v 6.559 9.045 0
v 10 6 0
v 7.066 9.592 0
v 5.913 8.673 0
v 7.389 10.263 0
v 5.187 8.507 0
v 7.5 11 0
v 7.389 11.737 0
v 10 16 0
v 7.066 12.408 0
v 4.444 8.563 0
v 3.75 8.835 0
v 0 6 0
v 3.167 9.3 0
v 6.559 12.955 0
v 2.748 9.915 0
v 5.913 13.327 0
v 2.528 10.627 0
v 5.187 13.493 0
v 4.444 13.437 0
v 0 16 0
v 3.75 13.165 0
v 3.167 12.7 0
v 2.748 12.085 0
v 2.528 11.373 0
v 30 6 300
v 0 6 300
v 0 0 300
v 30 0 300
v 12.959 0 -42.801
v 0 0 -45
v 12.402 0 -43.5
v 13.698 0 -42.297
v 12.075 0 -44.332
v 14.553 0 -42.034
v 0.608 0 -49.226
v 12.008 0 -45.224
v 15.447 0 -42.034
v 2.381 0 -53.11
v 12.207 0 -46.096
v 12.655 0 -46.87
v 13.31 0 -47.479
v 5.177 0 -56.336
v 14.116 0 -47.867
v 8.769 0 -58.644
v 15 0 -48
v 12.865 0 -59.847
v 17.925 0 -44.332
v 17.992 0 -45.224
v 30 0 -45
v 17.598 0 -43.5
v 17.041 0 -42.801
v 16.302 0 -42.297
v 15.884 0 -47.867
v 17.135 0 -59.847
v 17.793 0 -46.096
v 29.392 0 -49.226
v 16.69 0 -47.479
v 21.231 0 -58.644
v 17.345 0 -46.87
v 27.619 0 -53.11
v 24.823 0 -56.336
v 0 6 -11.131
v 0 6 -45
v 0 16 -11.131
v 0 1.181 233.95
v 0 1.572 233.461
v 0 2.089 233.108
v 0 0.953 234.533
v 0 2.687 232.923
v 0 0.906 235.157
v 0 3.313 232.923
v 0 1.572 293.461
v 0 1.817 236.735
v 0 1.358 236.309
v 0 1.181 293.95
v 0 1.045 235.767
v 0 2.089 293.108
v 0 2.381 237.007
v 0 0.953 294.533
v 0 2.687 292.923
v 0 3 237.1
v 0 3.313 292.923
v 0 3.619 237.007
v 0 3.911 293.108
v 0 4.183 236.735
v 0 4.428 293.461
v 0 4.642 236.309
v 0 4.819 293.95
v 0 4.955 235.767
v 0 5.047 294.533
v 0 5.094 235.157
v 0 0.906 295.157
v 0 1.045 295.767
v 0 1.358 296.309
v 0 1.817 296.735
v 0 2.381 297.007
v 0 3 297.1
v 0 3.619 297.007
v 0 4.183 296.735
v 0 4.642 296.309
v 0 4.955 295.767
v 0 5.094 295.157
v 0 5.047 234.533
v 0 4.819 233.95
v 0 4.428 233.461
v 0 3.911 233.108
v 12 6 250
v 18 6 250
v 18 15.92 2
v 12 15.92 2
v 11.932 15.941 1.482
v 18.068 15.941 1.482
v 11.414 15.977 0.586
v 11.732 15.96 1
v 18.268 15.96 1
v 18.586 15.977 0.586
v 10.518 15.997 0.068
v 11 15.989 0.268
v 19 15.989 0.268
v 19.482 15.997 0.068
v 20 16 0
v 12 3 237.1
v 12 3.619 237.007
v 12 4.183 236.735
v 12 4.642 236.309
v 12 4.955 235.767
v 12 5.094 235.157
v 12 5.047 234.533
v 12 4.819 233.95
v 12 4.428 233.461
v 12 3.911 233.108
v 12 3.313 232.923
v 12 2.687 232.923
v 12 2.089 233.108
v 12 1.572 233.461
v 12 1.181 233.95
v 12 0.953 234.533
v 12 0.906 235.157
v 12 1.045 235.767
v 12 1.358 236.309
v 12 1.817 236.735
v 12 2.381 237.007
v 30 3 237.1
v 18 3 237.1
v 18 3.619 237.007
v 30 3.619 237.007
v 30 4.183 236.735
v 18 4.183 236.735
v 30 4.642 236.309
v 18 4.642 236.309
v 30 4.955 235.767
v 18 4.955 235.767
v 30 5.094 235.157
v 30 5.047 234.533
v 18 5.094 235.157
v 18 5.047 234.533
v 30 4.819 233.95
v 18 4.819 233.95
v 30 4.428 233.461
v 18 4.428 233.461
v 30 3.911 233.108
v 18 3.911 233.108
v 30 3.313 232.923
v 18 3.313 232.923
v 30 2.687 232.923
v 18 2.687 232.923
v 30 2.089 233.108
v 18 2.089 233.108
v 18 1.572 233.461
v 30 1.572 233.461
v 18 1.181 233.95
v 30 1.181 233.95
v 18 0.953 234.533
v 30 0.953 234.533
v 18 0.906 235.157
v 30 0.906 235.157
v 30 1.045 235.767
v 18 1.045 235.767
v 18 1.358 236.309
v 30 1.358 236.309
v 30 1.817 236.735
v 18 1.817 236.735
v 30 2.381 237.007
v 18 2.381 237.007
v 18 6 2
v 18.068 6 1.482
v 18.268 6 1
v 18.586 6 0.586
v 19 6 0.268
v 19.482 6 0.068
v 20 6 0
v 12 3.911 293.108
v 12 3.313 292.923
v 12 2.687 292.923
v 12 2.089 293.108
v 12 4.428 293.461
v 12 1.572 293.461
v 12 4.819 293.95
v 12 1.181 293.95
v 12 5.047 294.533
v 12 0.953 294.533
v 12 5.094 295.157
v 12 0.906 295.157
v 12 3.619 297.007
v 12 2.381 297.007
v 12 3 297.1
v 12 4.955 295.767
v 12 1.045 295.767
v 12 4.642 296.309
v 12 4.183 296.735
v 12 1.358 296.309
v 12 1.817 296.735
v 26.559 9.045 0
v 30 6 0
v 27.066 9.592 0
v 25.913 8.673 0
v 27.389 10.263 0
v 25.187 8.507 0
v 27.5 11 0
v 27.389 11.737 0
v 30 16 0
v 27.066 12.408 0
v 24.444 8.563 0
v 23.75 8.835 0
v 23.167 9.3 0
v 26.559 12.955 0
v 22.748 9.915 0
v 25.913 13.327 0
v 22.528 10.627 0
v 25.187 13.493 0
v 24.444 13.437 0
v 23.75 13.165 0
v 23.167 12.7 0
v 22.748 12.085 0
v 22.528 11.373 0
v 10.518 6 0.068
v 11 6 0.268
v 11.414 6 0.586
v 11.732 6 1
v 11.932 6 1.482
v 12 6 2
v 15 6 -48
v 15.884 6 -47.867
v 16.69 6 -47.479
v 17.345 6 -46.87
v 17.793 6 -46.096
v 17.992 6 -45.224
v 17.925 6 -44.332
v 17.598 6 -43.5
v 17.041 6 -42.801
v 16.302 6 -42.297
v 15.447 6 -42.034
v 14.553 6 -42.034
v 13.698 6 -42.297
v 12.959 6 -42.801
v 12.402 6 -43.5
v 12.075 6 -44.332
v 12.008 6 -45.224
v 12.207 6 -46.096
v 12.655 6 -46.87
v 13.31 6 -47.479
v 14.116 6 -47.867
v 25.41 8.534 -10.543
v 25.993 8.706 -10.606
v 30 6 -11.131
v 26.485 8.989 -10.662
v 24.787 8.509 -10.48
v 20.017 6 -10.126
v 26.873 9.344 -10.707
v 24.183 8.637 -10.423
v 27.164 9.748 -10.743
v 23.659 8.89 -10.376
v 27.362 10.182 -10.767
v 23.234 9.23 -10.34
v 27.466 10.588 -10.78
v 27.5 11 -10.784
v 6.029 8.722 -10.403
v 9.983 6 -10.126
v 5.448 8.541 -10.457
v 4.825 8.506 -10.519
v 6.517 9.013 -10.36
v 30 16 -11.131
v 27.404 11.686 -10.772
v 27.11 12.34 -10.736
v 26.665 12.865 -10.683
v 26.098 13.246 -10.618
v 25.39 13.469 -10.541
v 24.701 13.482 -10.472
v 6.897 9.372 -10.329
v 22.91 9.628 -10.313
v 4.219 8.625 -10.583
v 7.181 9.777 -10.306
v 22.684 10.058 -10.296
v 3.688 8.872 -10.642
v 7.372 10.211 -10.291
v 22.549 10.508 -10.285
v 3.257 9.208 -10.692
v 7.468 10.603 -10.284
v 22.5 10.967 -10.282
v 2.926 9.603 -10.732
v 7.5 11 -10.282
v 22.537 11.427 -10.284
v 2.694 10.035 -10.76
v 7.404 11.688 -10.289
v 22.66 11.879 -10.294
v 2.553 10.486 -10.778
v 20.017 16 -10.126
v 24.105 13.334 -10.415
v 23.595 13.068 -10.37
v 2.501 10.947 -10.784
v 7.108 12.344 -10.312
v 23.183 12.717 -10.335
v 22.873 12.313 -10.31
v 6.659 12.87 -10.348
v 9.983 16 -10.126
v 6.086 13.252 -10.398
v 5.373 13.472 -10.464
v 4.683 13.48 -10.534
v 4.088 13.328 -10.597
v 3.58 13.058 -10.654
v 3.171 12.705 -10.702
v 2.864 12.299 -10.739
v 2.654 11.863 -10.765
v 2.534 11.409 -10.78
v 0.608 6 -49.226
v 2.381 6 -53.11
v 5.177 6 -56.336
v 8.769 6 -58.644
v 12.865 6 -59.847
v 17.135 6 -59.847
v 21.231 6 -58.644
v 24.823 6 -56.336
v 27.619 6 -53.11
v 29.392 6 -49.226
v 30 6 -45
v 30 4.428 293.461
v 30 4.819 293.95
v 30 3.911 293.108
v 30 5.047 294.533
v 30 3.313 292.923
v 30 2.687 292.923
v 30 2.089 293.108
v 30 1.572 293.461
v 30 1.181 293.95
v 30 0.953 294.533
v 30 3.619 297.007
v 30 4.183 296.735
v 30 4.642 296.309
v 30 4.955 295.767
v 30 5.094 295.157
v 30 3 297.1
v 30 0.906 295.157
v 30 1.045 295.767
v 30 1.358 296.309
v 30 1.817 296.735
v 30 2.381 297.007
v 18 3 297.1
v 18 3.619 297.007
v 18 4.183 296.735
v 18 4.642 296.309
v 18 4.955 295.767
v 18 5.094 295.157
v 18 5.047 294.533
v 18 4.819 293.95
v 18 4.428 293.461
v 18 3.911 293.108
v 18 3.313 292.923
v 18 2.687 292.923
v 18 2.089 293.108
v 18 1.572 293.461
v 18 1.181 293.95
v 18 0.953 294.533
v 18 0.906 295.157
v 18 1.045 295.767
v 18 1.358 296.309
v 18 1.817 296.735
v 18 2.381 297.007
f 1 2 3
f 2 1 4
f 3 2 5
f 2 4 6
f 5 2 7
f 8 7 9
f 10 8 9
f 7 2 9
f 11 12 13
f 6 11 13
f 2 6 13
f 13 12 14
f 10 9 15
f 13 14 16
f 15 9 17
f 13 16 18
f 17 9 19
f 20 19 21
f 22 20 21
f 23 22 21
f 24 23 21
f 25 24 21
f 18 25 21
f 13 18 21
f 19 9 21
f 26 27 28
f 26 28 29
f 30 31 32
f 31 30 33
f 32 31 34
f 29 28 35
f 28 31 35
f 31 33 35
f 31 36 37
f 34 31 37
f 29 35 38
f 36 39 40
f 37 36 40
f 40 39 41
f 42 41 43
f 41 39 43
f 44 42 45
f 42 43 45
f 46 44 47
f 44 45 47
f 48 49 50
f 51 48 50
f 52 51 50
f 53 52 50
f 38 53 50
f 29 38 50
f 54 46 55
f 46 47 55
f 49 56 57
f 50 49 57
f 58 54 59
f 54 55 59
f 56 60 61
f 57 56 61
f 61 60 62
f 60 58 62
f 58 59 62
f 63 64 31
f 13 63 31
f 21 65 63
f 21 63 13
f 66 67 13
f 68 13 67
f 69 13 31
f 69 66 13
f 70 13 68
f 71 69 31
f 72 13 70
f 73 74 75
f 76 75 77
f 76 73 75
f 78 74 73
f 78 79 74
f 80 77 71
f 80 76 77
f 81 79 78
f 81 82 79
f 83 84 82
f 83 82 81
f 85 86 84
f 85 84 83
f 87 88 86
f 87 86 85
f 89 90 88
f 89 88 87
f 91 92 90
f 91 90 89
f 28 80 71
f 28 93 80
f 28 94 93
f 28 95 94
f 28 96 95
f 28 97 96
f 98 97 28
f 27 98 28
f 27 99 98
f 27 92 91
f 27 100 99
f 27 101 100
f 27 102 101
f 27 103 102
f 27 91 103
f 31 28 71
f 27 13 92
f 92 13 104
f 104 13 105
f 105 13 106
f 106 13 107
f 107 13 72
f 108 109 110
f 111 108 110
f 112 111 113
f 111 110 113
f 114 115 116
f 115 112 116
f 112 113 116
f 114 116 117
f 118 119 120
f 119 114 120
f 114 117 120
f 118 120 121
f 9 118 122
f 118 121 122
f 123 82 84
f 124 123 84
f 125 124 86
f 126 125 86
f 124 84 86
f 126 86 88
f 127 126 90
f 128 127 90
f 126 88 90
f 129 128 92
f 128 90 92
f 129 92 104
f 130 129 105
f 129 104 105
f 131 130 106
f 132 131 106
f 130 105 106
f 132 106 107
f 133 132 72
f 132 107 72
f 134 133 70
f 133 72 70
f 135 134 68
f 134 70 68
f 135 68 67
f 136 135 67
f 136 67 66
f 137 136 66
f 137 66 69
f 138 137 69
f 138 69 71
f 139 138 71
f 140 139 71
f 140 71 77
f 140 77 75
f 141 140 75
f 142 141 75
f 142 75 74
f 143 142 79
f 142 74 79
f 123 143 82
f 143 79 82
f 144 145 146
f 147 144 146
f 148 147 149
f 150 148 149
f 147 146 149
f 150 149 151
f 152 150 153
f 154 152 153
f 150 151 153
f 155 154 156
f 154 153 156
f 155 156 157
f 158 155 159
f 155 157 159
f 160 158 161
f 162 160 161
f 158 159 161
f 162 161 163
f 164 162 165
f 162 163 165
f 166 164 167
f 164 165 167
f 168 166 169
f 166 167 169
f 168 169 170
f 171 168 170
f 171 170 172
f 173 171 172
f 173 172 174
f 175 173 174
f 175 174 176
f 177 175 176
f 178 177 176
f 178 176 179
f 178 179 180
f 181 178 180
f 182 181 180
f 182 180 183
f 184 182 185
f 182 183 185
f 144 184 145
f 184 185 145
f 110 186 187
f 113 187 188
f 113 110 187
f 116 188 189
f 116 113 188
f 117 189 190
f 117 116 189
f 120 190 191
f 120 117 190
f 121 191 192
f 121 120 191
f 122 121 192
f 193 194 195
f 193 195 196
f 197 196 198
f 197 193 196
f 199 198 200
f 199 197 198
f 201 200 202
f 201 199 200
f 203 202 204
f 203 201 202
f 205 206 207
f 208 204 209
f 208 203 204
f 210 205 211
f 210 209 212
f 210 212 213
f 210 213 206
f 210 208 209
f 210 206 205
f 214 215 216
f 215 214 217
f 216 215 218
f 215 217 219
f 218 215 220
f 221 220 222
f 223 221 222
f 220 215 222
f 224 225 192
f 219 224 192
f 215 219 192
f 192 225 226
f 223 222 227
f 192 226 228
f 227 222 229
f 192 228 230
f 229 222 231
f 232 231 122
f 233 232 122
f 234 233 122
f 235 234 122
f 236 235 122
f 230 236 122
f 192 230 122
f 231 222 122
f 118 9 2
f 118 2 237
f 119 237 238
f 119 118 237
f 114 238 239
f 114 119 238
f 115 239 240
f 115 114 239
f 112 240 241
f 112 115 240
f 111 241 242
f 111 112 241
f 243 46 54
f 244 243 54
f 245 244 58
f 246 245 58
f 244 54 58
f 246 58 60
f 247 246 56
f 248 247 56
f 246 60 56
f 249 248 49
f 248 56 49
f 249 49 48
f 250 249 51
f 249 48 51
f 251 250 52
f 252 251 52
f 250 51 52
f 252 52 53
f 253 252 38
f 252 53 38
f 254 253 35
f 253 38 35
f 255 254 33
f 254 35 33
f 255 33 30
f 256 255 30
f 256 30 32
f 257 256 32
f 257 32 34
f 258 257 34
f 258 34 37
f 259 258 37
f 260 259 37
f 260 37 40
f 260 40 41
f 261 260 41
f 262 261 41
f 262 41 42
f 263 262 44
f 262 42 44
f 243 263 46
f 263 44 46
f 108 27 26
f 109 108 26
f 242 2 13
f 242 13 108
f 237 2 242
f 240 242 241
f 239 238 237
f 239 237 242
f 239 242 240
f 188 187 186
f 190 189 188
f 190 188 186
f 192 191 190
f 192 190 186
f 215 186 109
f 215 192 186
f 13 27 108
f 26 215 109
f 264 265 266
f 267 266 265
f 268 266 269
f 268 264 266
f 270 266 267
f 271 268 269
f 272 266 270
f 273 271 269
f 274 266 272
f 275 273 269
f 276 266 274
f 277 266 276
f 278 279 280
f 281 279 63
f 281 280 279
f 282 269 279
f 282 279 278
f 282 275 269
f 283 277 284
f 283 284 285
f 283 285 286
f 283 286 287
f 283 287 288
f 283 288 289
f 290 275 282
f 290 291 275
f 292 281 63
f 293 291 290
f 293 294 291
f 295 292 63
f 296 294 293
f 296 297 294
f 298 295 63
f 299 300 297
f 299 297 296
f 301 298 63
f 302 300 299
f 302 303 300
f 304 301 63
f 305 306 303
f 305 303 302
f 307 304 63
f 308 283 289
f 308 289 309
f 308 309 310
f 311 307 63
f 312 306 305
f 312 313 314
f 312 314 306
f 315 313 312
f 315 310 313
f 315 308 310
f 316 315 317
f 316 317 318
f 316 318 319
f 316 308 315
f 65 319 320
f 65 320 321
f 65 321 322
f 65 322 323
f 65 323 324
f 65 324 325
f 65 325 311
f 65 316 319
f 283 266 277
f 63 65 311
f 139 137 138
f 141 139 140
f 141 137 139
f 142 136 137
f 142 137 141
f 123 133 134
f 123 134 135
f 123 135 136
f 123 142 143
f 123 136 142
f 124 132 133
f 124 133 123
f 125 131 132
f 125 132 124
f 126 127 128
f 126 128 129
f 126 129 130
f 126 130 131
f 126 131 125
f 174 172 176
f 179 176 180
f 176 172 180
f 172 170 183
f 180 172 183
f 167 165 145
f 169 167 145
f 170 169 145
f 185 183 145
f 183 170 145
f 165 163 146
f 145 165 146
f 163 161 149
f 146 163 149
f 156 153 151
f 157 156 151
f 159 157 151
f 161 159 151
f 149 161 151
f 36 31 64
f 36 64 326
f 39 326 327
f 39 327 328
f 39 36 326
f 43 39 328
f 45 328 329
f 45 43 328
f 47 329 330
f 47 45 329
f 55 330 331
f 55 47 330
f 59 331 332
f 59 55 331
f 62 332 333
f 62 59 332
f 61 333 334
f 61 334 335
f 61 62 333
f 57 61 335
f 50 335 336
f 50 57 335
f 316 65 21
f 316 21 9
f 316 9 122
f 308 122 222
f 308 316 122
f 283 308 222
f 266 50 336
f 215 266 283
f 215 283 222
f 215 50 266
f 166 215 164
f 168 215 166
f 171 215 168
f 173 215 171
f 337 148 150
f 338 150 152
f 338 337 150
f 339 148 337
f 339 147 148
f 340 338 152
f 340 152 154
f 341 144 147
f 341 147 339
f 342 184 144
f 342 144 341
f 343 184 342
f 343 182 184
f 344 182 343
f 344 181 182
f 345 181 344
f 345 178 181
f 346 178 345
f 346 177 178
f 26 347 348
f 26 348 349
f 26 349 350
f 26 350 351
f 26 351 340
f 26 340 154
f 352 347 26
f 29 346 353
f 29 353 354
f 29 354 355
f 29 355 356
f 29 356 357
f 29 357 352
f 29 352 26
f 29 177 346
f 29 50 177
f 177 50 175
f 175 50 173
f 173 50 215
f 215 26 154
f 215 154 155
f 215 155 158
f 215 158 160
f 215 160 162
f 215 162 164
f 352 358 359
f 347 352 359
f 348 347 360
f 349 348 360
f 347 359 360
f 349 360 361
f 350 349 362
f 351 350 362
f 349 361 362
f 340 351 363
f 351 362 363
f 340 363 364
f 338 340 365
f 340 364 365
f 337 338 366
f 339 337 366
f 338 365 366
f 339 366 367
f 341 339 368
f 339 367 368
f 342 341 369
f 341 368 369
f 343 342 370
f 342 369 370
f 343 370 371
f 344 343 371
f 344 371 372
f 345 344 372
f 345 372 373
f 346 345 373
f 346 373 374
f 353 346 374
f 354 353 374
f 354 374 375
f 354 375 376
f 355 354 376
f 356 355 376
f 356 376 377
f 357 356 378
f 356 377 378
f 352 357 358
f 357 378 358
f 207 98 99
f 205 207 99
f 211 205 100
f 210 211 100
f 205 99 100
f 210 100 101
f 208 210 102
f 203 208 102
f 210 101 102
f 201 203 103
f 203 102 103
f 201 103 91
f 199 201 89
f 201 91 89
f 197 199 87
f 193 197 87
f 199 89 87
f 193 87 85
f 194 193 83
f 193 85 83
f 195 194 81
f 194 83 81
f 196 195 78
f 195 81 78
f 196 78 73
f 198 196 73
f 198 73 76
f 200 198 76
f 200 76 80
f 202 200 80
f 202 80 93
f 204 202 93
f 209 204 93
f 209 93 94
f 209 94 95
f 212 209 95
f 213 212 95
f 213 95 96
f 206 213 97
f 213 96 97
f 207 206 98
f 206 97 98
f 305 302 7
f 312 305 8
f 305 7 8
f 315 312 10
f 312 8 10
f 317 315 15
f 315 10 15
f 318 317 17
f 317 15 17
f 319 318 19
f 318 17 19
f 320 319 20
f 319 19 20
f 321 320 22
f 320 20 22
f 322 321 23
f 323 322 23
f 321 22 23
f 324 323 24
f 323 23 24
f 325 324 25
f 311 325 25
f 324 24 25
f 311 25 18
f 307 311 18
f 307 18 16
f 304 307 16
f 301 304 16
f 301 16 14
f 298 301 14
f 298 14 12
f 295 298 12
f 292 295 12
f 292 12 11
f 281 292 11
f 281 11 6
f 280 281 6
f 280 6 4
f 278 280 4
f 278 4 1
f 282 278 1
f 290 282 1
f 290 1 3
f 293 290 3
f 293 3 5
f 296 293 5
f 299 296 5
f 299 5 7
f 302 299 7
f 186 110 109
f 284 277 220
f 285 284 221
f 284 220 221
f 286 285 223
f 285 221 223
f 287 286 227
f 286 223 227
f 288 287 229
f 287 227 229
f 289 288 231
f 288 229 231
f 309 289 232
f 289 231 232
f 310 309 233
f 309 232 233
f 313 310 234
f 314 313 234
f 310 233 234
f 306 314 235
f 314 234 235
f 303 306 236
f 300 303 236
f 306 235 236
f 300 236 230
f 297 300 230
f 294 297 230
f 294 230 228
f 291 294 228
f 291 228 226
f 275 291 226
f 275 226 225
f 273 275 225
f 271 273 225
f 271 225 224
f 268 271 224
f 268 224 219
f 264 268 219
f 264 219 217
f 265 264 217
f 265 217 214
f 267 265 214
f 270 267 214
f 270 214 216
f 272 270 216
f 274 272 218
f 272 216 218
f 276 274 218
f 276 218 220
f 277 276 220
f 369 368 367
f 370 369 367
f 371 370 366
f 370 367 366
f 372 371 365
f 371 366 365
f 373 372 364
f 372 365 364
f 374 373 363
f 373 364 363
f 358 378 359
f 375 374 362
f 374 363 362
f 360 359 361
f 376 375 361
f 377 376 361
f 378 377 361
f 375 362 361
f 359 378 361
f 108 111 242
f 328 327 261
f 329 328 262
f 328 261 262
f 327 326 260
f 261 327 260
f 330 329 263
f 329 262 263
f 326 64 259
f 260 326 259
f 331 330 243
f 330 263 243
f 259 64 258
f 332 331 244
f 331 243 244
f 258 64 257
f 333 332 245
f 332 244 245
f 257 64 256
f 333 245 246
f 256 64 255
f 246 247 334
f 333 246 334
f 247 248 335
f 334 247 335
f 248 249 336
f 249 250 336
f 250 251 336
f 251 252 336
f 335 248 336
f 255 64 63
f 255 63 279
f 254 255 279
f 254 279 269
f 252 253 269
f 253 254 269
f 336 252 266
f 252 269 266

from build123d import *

# Parameters (mm, degrees)
ESQUISSE1_W             = 30
ESQUISSE1_H             = 6
BOSS_EXTRU_1_DEPTH      = 300
BOSS_EXTRU_2_DEPTH      = 3
BOSS_EXTRU_2_DEPTH_BACK = 3
ESQUISSE4_W             = 30
ESQUISSE4_H             = 16
BOSS_EXTRU_3_DEPTH      = 10
ESQUISSE7_R             = 3
BOSS_EXTRU_5_DEPTH      = 6
ESQUISSE8_R             = 2.1
ENL_V_MAT_EXTRU_1_DEPTH = 12
ENL_V_START             = -18
ESQUISSE8_2_R           = 2.1
ENL_V_MAT_EXTRU_3_DEPTH = 12
BOSS_EXTRU_6_DEPTH      = 16
ESQUISSE10_R            = 2.5
ENL_V_MAT_EXTRU_4_DEPTH = 302.920519342
CONG_1_R                = 2


with BuildPart() as part:
    # Esquisse1 → Boss.-Extru.1 (new body)
    with BuildSketch(Plane.XY):
        with Locations((15, 3)):
            Rectangle(ESQUISSE1_W, ESQUISSE1_H)
    extrude(amount=BOSS_EXTRU_1_DEPTH)

    # Esquisse3 → Boss.-Extru.2 (add, two sides: drawn at the far end of the back side and taken through both)
    with BuildSketch(Plane(origin=(15, 0, 0), x_dir=(0, 0, -1), z_dir=(1, 0, 0)).offset(-BOSS_EXTRU_2_DEPTH_BACK)):
        Polygon((-250, 6), (0, 16), (0, 6), align=None)
    extrude(amount=BOSS_EXTRU_2_DEPTH + BOSS_EXTRU_2_DEPTH_BACK)

    # Esquisse4 → Boss.-Extru.3 (add)
    with BuildSketch(Plane(origin=(0, 0, 0), x_dir=(-1, 0, 0), z_dir=(0, 0, -1))):
        with Locations((-15, 8)):
            Rectangle(ESQUISSE4_W, ESQUISSE4_H)
    extrude(amount=BOSS_EXTRU_3_DEPTH)

    # Esquisse7 → Boss.-Extru.5 (add)
    with BuildSketch(Plane.XZ):
        with BuildLine():
            Line((0, -10), (0, -45))
            ThreePointArc((0, -45), (15, -60), (30, -45))
            Line((30, -45), (30, -10))
            Line((30, -10), (0, -10))
        make_face()
        with Locations(Location((15, -45, 0), (0, 0, 270))):
            Circle(ESQUISSE7_R, mode=Mode.SUBTRACT)
    extrude(amount=-BOSS_EXTRU_5_DEPTH)

    # Esquisse8 → Enlèv. mat.-Extru.1 (cut)
    with BuildSketch(Plane.ZY):
        with Locations((295, 3)):
            Circle(ESQUISSE8_R)
        with Locations((235, 3)):
            Circle(ESQUISSE8_R)
    extrude(amount=-ENL_V_MAT_EXTRU_1_DEPTH, mode=Mode.SUBTRACT)

    # Esquisse8<2> → Enlèv. mat.-Extru.3 (cut)
    with BuildSketch(Plane.ZY.offset(ENL_V_START)):
        with Locations((295, 3)):
            Circle(ESQUISSE8_2_R)
        with Locations((235, 3)):
            Circle(ESQUISSE8_2_R)
    extrude(amount=-ENL_V_MAT_EXTRU_3_DEPTH, mode=Mode.SUBTRACT)

    # Esquisse9 → Boss.-Extru.6 (add)
    with BuildSketch(Plane(origin=(0, 16, 0), x_dir=(1, 0, 0), z_dir=(0, 1, 0))):
        with BuildLine():
            Line((0, 11.131400334), (0, 0))
            Line((0, 0), (30, 0))
            Line((30, 0), (30, 11.131400334))
            ThreePointArc((30, 11.131400334), (15, 10), (0, 11.131400334))
        make_face()
    extrude(amount=-BOSS_EXTRU_6_DEPTH)

    # Esquisse10 → Enlèv. mat.-Extru.4 (cut, through all)
    with BuildSketch(Plane.XY):
        with Locations((5, 11)):
            Circle(ESQUISSE10_R)
        with Locations((25, 11)):
            Circle(ESQUISSE10_R)
    extrude(amount=-ENL_V_MAT_EXTRU_4_DEPTH, mode=Mode.SUBTRACT)

    # Congé1
    # the kernel refuses this fillet: 2 mm, written as the material it adds along each edge
    with BuildSketch(Plane(origin=(12, 16, 0), x_dir=(-1, 0, 0), z_dir=(0, -1, 0))) as cong_1_piece_1_section:
        with BuildLine():
            CenterArc((CONG_1_R, -CONG_1_R), CONG_1_R, 90, 90)
            Line((0, -CONG_1_R), (0, 0))
            Line((0, 0), (CONG_1_R, 0))
        make_face()
    cong_1_piece_1 = extrude(amount=15, mode=Mode.PRIVATE)
    cong_1_piece_1 = split(cong_1_piece_1, bisect_by=Plane(origin=(11.546773045, 15.973945238, 0.651369053), z_dir=(0, -0.9992009587217895, -0.03996803834887158)), keep=Keep.TOP, mode=Mode.PRIVATE)
    add(cong_1_piece_1)
    with BuildSketch(Plane(origin=(18, 16, 0), x_dir=(1, 0, 0), z_dir=(0, -1, 0))) as cong_1_piece_2_section:
        with BuildLine():
            CenterArc((CONG_1_R, CONG_1_R), CONG_1_R, 180, 90)
            Line((0, CONG_1_R), (0, 0))
            Line((0, 0), (CONG_1_R, 0))
        make_face()
    cong_1_piece_2 = extrude(amount=15, mode=Mode.PRIVATE)
    cong_1_piece_2 = split(cong_1_piece_2, bisect_by=Plane(origin=(18.453226955, 15.973945238, 0.651369053), z_dir=(0, -0.9992009587217895, -0.03996803834887158)), keep=Keep.TOP, mode=Mode.PRIVATE)
    add(cong_1_piece_2)


solid = part.part
